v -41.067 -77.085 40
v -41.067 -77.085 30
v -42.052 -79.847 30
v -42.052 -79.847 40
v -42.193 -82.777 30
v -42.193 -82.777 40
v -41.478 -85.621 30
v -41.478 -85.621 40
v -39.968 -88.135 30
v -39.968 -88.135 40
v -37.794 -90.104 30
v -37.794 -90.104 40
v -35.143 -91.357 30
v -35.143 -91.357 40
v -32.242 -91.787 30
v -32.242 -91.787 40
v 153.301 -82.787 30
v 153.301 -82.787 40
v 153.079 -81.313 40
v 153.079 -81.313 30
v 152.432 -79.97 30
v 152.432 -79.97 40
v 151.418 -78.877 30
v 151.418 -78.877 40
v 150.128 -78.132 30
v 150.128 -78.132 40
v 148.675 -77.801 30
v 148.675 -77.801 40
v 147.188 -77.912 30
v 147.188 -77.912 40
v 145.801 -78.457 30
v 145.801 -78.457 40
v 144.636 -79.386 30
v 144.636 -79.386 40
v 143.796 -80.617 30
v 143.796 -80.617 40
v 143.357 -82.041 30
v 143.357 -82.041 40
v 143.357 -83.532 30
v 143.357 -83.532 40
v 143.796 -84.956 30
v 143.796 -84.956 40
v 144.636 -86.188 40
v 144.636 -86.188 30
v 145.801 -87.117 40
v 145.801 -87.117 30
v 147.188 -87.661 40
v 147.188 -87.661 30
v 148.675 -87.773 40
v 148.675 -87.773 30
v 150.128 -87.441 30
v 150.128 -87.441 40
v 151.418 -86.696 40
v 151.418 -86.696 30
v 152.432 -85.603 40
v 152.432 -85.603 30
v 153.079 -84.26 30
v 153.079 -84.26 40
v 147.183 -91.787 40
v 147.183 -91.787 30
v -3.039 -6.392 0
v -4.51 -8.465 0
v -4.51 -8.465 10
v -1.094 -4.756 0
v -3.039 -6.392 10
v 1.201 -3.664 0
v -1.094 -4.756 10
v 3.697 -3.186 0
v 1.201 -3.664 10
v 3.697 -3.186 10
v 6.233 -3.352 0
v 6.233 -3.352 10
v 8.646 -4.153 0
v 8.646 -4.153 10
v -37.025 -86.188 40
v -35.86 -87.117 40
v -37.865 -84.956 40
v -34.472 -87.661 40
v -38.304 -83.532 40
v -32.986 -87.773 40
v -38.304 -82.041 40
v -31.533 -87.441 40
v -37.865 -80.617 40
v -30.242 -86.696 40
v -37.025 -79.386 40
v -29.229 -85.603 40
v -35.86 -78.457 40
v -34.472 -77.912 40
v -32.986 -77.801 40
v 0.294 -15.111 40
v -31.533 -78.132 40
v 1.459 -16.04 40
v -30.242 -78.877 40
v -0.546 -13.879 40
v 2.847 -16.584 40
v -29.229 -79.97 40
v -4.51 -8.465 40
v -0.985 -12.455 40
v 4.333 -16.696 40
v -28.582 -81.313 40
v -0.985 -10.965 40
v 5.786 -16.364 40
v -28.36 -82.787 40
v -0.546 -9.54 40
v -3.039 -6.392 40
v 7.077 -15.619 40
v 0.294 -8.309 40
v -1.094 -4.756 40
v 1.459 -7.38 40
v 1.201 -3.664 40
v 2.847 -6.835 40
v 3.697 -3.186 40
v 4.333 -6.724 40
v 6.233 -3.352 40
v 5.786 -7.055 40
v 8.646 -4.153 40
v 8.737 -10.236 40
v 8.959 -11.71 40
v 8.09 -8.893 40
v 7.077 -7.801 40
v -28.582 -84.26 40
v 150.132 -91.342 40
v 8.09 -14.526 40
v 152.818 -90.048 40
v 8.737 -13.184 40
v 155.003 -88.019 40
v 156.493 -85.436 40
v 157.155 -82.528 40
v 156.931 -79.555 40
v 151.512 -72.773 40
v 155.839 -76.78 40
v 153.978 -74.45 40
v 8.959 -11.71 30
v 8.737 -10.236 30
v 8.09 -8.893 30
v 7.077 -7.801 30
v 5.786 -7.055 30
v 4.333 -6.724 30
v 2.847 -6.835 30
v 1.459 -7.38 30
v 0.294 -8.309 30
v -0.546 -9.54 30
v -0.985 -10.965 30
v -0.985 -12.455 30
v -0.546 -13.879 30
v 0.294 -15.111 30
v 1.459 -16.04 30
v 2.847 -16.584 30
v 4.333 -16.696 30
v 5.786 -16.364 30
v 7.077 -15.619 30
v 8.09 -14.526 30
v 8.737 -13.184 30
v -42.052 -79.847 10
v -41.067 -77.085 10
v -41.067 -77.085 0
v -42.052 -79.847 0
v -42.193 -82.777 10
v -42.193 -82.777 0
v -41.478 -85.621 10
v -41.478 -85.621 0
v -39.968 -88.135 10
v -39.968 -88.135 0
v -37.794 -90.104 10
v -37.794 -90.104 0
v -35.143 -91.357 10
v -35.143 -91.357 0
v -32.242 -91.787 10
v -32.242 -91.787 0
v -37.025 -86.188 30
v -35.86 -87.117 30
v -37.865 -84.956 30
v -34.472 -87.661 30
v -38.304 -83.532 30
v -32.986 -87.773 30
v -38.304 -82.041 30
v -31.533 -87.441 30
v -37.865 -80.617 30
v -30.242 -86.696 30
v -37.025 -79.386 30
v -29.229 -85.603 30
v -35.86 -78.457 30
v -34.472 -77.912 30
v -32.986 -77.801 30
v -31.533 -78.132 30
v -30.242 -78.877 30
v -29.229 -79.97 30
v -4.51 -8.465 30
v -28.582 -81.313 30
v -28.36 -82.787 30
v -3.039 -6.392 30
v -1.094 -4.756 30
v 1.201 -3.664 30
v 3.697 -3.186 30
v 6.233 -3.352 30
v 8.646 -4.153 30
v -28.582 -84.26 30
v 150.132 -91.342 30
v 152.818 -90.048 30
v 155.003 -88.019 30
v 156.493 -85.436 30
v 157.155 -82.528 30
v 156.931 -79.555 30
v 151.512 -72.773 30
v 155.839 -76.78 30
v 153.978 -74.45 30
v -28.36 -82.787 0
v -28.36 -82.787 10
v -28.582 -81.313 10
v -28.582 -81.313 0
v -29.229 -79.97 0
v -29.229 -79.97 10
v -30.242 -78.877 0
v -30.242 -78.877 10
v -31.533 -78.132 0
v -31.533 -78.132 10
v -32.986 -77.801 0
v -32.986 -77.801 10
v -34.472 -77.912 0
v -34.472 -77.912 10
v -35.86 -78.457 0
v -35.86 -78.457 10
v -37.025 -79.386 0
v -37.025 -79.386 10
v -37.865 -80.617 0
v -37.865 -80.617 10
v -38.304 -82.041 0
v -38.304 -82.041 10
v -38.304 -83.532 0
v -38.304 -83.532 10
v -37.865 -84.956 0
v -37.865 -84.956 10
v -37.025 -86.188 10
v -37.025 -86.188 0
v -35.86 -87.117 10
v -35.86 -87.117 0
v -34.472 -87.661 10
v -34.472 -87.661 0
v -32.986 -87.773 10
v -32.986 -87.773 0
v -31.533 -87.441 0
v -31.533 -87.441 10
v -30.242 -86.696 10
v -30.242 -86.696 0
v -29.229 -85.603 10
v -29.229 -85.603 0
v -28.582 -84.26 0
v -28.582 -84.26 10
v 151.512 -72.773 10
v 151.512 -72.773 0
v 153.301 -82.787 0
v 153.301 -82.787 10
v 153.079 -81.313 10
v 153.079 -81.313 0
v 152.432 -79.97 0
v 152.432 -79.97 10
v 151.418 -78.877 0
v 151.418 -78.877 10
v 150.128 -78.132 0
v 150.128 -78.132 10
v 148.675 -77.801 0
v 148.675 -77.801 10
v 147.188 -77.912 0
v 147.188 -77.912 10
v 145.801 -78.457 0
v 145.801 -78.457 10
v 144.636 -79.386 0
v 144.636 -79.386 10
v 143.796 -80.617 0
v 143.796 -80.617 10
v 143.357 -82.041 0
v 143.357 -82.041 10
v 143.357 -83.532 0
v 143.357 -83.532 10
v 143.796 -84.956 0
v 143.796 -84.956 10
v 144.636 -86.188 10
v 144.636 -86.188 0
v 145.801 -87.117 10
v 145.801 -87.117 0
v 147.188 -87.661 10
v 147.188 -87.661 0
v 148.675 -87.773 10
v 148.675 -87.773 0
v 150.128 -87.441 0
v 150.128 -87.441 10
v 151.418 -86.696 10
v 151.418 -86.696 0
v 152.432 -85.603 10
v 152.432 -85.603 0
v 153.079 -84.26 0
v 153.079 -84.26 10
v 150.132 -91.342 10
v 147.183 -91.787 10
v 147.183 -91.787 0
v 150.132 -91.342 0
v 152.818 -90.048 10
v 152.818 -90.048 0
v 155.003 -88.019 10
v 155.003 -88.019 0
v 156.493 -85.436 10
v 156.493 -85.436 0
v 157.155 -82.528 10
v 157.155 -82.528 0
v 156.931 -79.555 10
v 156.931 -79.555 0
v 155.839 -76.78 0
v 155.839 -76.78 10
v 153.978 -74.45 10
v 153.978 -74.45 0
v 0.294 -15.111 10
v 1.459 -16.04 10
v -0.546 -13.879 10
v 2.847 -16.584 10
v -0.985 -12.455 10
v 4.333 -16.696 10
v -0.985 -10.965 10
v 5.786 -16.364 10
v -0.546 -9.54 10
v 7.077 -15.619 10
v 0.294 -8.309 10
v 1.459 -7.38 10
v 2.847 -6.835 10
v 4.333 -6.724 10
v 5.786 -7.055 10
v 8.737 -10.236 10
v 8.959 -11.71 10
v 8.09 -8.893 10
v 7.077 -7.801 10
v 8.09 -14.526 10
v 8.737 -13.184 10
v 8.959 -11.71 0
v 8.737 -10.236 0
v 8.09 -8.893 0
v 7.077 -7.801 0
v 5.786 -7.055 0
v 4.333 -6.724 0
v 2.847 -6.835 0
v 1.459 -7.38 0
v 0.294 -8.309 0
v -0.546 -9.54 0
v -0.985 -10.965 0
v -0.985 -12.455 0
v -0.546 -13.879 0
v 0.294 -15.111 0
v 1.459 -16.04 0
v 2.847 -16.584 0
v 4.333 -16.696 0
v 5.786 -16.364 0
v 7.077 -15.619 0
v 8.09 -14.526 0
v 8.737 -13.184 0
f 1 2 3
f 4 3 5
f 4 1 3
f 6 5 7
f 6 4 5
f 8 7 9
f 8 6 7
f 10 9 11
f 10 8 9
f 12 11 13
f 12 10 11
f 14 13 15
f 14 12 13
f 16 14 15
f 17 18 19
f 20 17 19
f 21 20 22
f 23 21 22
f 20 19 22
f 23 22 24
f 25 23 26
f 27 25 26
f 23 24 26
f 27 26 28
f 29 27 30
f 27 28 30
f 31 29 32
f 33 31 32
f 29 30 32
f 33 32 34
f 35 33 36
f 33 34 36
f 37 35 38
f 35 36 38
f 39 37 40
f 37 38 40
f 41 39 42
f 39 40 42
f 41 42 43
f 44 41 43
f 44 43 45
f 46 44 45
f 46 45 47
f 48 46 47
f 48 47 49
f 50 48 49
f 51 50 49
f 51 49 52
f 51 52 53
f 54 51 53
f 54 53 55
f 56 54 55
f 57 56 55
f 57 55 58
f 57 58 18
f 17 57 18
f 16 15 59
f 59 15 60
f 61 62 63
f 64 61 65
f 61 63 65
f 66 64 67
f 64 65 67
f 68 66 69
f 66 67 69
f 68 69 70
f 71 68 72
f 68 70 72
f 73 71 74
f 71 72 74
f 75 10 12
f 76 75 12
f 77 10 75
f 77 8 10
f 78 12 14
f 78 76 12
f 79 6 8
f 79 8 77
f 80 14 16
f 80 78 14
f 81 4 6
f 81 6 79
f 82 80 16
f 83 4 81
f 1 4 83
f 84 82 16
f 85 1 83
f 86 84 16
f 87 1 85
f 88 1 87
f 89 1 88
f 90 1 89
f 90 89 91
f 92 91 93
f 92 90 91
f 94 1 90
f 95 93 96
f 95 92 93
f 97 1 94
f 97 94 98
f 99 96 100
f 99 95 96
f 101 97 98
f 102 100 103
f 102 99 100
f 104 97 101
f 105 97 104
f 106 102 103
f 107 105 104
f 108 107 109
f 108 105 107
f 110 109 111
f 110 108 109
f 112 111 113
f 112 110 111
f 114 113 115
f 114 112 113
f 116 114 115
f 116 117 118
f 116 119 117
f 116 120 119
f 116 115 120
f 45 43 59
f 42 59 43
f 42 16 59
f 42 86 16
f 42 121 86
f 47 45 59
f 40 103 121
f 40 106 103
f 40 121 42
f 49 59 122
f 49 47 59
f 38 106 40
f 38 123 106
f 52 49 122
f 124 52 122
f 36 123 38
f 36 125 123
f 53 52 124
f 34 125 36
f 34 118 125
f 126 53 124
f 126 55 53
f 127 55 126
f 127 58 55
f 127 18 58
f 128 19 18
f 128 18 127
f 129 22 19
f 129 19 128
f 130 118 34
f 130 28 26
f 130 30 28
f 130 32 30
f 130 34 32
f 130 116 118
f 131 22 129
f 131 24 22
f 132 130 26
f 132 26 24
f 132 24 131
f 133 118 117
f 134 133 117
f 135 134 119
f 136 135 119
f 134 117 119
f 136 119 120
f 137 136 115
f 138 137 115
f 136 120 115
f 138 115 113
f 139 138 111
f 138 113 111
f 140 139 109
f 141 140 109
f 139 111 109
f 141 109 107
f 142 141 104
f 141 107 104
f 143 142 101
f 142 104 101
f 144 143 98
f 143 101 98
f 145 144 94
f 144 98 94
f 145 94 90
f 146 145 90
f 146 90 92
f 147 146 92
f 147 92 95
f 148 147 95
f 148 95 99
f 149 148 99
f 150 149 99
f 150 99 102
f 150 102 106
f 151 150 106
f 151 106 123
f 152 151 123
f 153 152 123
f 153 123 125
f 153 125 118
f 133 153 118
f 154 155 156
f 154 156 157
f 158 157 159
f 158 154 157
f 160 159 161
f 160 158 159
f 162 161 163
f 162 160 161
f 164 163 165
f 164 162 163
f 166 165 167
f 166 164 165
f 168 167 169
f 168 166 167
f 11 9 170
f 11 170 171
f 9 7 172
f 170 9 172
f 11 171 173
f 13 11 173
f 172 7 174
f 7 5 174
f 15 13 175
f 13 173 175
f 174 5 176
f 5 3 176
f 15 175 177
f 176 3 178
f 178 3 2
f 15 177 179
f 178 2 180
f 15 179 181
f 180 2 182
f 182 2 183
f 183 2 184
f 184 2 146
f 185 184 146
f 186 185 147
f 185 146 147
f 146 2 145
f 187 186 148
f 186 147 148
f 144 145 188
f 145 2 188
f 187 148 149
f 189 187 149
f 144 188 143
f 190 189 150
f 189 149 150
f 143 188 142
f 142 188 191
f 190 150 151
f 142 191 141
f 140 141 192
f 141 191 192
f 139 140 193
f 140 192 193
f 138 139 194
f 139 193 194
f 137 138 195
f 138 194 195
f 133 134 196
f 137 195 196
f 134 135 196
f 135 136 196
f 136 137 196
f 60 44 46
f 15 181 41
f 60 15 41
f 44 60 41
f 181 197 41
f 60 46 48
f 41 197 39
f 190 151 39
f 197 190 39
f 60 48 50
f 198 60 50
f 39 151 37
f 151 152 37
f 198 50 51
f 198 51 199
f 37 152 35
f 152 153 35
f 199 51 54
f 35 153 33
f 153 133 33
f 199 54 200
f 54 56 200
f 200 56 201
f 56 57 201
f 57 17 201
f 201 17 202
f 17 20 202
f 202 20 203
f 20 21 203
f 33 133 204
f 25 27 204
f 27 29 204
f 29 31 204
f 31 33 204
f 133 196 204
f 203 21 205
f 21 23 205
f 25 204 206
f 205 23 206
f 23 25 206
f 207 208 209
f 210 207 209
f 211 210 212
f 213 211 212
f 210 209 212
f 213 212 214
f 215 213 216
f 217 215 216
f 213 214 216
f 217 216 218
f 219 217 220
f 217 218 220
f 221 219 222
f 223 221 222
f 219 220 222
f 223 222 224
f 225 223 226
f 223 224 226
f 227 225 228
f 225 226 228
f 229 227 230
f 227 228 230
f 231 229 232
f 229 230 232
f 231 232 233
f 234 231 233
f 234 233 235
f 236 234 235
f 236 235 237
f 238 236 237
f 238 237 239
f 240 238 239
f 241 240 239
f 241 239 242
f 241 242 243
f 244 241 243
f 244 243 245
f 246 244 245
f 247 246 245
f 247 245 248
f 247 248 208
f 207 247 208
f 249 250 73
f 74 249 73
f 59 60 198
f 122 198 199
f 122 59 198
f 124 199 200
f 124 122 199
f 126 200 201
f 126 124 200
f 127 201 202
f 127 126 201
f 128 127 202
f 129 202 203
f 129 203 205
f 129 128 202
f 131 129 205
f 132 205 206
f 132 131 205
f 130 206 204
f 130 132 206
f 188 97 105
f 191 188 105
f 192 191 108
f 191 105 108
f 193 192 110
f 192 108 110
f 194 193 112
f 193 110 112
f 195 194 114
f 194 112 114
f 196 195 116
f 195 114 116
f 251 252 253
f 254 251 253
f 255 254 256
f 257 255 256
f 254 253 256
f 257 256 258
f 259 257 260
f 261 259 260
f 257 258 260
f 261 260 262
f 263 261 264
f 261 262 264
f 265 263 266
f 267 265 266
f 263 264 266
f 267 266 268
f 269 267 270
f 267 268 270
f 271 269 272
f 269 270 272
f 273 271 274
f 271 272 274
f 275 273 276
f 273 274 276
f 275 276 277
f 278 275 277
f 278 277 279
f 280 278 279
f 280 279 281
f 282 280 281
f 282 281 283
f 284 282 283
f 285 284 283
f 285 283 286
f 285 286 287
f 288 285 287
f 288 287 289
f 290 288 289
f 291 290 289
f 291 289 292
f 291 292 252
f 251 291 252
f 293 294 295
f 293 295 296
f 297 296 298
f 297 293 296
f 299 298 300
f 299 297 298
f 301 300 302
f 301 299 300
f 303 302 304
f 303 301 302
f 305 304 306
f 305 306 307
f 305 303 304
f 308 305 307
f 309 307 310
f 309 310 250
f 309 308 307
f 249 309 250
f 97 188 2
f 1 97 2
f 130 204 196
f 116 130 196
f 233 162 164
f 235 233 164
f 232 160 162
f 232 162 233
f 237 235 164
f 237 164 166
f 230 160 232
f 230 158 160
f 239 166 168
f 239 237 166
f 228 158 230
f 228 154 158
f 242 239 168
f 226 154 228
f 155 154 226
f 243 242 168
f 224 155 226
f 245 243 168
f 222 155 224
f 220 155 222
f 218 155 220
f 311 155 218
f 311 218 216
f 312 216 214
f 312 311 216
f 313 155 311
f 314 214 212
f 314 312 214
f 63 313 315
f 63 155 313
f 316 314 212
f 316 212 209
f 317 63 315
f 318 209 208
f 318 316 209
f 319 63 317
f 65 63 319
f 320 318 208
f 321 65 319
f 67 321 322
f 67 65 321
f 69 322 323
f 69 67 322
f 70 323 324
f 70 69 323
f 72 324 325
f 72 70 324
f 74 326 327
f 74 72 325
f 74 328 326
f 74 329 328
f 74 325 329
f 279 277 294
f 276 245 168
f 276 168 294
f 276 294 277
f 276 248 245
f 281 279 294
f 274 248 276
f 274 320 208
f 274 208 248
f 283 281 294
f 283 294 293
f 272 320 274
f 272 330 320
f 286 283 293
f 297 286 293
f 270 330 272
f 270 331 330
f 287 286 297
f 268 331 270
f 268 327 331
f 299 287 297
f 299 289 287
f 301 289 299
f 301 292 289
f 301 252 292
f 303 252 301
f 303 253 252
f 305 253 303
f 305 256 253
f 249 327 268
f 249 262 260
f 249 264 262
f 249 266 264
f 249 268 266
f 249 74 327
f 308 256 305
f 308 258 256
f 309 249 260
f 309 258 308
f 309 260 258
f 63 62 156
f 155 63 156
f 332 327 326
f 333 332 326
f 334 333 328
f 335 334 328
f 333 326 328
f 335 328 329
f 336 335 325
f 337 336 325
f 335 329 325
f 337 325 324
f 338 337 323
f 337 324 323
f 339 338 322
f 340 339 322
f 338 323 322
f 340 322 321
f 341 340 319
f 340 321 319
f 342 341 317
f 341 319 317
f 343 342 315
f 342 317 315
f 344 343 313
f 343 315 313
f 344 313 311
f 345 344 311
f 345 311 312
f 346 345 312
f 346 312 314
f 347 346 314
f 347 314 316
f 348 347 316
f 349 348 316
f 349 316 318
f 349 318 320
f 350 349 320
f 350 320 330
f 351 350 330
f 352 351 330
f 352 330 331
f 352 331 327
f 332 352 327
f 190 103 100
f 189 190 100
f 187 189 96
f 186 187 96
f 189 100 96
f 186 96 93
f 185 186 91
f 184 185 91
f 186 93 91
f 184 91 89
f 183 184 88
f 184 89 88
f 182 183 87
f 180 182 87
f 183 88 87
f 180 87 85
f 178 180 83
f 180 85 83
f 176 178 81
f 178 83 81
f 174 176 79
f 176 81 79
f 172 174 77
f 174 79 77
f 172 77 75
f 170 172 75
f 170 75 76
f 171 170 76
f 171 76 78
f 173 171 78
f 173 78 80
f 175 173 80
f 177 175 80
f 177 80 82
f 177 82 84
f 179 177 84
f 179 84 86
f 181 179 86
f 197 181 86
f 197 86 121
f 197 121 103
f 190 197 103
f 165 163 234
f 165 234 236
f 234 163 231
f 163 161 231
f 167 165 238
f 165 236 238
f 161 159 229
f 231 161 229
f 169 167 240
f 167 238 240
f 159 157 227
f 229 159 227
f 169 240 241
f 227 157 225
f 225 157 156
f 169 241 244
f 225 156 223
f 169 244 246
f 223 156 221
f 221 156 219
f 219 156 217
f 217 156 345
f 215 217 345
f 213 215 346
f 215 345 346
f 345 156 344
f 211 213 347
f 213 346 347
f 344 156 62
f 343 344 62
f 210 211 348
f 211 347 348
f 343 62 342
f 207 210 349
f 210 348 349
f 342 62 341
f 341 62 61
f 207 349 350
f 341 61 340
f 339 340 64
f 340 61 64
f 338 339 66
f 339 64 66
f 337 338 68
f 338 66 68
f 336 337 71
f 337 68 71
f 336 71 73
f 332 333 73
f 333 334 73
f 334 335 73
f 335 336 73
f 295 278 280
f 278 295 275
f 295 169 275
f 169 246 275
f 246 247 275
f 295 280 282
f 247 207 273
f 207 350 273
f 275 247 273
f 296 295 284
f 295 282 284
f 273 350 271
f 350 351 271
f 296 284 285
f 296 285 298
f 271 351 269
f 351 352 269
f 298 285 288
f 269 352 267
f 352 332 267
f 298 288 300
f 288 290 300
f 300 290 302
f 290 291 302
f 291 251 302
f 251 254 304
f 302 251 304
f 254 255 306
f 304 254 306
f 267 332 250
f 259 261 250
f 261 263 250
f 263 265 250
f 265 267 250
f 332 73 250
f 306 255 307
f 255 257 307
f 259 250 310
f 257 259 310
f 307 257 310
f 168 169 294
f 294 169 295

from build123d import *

# Parameters (mm, degrees)
BOSS_EXTRUDE1_DEPTH = 40
FILLET1_R           = 10
SKETCH2_R           = 5
CUT_EXTRUDE1_DEPTH  = 187.36326547
SKETCH3_W           = 439.206836257
SKETCH3_H           = 20
CUT_EXTRUDE2_DEPTH  = 187.36326547


with BuildPart() as part:
    # Sketch1 → Boss-Extrude1 (new body)
    with BuildSketch(Plane.XY):
        Polygon((0, 0), (-48.9, -91.786654803), (191.1, -91.786654803), align=None)
    extrude(amount=BOSS_EXTRUDE1_DEPTH)

    # Fillet1
    fillet1_edges = [part.edges().sort_by_distance(p)[0] for p in [
        (191.1, -91.786654803, 20),
        (-48.9, -91.786654803, 20),
        (0, 0, 20),
    ]]
    fillet(fillet1_edges, radius=FILLET1_R)

    # Sketch2 → Cut-Extrude1 (cut, through all)
    with BuildSketch(Plane.XY.offset(40)):
        with Locations((3.959113896, -11.709737823)):
            Circle(SKETCH2_R)
        with Locations((-33.359838925, -82.786654803)):
            Circle(SKETCH2_R)
        with Locations((148.300974274, -82.786654803)):
            Circle(SKETCH2_R)
    extrude(amount=-CUT_EXTRUDE1_DEPTH, mode=Mode.SUBTRACT)

    # Sketch3 → Cut-Extrude2 (cut, through all)
    with BuildSketch(Plane(origin=(0, 0, 0), x_dir=(1, 0, 0), z_dir=(0, 1, 0))):
        with Locations((151.512499475, -20)):
            Rectangle(SKETCH3_W, SKETCH3_H)
    extrude(amount=-CUT_EXTRUDE2_DEPTH, mode=Mode.SUBTRACT)


with BuildPart() as cut_extrude2_piece_1:
    # of the separate pieces the step leaves, piece 1, a body of its own (cut_extrude2_pieces)
    add(part.part.solids().sort_by_distance((-4.509652982, -8.46474359, 0))[0])


with BuildPart() as cut_extrude2_piece_2:
    # of the separate pieces the step leaves, piece 2, a body of its own (cut_extrude2_pieces)
    add(part.part.solids().sort_by_distance((-41.067444821, -77.084731726, 30))[0])


solid = Compound([cut_extrude2_piece_1.part, cut_extrude2_piece_2.part])
